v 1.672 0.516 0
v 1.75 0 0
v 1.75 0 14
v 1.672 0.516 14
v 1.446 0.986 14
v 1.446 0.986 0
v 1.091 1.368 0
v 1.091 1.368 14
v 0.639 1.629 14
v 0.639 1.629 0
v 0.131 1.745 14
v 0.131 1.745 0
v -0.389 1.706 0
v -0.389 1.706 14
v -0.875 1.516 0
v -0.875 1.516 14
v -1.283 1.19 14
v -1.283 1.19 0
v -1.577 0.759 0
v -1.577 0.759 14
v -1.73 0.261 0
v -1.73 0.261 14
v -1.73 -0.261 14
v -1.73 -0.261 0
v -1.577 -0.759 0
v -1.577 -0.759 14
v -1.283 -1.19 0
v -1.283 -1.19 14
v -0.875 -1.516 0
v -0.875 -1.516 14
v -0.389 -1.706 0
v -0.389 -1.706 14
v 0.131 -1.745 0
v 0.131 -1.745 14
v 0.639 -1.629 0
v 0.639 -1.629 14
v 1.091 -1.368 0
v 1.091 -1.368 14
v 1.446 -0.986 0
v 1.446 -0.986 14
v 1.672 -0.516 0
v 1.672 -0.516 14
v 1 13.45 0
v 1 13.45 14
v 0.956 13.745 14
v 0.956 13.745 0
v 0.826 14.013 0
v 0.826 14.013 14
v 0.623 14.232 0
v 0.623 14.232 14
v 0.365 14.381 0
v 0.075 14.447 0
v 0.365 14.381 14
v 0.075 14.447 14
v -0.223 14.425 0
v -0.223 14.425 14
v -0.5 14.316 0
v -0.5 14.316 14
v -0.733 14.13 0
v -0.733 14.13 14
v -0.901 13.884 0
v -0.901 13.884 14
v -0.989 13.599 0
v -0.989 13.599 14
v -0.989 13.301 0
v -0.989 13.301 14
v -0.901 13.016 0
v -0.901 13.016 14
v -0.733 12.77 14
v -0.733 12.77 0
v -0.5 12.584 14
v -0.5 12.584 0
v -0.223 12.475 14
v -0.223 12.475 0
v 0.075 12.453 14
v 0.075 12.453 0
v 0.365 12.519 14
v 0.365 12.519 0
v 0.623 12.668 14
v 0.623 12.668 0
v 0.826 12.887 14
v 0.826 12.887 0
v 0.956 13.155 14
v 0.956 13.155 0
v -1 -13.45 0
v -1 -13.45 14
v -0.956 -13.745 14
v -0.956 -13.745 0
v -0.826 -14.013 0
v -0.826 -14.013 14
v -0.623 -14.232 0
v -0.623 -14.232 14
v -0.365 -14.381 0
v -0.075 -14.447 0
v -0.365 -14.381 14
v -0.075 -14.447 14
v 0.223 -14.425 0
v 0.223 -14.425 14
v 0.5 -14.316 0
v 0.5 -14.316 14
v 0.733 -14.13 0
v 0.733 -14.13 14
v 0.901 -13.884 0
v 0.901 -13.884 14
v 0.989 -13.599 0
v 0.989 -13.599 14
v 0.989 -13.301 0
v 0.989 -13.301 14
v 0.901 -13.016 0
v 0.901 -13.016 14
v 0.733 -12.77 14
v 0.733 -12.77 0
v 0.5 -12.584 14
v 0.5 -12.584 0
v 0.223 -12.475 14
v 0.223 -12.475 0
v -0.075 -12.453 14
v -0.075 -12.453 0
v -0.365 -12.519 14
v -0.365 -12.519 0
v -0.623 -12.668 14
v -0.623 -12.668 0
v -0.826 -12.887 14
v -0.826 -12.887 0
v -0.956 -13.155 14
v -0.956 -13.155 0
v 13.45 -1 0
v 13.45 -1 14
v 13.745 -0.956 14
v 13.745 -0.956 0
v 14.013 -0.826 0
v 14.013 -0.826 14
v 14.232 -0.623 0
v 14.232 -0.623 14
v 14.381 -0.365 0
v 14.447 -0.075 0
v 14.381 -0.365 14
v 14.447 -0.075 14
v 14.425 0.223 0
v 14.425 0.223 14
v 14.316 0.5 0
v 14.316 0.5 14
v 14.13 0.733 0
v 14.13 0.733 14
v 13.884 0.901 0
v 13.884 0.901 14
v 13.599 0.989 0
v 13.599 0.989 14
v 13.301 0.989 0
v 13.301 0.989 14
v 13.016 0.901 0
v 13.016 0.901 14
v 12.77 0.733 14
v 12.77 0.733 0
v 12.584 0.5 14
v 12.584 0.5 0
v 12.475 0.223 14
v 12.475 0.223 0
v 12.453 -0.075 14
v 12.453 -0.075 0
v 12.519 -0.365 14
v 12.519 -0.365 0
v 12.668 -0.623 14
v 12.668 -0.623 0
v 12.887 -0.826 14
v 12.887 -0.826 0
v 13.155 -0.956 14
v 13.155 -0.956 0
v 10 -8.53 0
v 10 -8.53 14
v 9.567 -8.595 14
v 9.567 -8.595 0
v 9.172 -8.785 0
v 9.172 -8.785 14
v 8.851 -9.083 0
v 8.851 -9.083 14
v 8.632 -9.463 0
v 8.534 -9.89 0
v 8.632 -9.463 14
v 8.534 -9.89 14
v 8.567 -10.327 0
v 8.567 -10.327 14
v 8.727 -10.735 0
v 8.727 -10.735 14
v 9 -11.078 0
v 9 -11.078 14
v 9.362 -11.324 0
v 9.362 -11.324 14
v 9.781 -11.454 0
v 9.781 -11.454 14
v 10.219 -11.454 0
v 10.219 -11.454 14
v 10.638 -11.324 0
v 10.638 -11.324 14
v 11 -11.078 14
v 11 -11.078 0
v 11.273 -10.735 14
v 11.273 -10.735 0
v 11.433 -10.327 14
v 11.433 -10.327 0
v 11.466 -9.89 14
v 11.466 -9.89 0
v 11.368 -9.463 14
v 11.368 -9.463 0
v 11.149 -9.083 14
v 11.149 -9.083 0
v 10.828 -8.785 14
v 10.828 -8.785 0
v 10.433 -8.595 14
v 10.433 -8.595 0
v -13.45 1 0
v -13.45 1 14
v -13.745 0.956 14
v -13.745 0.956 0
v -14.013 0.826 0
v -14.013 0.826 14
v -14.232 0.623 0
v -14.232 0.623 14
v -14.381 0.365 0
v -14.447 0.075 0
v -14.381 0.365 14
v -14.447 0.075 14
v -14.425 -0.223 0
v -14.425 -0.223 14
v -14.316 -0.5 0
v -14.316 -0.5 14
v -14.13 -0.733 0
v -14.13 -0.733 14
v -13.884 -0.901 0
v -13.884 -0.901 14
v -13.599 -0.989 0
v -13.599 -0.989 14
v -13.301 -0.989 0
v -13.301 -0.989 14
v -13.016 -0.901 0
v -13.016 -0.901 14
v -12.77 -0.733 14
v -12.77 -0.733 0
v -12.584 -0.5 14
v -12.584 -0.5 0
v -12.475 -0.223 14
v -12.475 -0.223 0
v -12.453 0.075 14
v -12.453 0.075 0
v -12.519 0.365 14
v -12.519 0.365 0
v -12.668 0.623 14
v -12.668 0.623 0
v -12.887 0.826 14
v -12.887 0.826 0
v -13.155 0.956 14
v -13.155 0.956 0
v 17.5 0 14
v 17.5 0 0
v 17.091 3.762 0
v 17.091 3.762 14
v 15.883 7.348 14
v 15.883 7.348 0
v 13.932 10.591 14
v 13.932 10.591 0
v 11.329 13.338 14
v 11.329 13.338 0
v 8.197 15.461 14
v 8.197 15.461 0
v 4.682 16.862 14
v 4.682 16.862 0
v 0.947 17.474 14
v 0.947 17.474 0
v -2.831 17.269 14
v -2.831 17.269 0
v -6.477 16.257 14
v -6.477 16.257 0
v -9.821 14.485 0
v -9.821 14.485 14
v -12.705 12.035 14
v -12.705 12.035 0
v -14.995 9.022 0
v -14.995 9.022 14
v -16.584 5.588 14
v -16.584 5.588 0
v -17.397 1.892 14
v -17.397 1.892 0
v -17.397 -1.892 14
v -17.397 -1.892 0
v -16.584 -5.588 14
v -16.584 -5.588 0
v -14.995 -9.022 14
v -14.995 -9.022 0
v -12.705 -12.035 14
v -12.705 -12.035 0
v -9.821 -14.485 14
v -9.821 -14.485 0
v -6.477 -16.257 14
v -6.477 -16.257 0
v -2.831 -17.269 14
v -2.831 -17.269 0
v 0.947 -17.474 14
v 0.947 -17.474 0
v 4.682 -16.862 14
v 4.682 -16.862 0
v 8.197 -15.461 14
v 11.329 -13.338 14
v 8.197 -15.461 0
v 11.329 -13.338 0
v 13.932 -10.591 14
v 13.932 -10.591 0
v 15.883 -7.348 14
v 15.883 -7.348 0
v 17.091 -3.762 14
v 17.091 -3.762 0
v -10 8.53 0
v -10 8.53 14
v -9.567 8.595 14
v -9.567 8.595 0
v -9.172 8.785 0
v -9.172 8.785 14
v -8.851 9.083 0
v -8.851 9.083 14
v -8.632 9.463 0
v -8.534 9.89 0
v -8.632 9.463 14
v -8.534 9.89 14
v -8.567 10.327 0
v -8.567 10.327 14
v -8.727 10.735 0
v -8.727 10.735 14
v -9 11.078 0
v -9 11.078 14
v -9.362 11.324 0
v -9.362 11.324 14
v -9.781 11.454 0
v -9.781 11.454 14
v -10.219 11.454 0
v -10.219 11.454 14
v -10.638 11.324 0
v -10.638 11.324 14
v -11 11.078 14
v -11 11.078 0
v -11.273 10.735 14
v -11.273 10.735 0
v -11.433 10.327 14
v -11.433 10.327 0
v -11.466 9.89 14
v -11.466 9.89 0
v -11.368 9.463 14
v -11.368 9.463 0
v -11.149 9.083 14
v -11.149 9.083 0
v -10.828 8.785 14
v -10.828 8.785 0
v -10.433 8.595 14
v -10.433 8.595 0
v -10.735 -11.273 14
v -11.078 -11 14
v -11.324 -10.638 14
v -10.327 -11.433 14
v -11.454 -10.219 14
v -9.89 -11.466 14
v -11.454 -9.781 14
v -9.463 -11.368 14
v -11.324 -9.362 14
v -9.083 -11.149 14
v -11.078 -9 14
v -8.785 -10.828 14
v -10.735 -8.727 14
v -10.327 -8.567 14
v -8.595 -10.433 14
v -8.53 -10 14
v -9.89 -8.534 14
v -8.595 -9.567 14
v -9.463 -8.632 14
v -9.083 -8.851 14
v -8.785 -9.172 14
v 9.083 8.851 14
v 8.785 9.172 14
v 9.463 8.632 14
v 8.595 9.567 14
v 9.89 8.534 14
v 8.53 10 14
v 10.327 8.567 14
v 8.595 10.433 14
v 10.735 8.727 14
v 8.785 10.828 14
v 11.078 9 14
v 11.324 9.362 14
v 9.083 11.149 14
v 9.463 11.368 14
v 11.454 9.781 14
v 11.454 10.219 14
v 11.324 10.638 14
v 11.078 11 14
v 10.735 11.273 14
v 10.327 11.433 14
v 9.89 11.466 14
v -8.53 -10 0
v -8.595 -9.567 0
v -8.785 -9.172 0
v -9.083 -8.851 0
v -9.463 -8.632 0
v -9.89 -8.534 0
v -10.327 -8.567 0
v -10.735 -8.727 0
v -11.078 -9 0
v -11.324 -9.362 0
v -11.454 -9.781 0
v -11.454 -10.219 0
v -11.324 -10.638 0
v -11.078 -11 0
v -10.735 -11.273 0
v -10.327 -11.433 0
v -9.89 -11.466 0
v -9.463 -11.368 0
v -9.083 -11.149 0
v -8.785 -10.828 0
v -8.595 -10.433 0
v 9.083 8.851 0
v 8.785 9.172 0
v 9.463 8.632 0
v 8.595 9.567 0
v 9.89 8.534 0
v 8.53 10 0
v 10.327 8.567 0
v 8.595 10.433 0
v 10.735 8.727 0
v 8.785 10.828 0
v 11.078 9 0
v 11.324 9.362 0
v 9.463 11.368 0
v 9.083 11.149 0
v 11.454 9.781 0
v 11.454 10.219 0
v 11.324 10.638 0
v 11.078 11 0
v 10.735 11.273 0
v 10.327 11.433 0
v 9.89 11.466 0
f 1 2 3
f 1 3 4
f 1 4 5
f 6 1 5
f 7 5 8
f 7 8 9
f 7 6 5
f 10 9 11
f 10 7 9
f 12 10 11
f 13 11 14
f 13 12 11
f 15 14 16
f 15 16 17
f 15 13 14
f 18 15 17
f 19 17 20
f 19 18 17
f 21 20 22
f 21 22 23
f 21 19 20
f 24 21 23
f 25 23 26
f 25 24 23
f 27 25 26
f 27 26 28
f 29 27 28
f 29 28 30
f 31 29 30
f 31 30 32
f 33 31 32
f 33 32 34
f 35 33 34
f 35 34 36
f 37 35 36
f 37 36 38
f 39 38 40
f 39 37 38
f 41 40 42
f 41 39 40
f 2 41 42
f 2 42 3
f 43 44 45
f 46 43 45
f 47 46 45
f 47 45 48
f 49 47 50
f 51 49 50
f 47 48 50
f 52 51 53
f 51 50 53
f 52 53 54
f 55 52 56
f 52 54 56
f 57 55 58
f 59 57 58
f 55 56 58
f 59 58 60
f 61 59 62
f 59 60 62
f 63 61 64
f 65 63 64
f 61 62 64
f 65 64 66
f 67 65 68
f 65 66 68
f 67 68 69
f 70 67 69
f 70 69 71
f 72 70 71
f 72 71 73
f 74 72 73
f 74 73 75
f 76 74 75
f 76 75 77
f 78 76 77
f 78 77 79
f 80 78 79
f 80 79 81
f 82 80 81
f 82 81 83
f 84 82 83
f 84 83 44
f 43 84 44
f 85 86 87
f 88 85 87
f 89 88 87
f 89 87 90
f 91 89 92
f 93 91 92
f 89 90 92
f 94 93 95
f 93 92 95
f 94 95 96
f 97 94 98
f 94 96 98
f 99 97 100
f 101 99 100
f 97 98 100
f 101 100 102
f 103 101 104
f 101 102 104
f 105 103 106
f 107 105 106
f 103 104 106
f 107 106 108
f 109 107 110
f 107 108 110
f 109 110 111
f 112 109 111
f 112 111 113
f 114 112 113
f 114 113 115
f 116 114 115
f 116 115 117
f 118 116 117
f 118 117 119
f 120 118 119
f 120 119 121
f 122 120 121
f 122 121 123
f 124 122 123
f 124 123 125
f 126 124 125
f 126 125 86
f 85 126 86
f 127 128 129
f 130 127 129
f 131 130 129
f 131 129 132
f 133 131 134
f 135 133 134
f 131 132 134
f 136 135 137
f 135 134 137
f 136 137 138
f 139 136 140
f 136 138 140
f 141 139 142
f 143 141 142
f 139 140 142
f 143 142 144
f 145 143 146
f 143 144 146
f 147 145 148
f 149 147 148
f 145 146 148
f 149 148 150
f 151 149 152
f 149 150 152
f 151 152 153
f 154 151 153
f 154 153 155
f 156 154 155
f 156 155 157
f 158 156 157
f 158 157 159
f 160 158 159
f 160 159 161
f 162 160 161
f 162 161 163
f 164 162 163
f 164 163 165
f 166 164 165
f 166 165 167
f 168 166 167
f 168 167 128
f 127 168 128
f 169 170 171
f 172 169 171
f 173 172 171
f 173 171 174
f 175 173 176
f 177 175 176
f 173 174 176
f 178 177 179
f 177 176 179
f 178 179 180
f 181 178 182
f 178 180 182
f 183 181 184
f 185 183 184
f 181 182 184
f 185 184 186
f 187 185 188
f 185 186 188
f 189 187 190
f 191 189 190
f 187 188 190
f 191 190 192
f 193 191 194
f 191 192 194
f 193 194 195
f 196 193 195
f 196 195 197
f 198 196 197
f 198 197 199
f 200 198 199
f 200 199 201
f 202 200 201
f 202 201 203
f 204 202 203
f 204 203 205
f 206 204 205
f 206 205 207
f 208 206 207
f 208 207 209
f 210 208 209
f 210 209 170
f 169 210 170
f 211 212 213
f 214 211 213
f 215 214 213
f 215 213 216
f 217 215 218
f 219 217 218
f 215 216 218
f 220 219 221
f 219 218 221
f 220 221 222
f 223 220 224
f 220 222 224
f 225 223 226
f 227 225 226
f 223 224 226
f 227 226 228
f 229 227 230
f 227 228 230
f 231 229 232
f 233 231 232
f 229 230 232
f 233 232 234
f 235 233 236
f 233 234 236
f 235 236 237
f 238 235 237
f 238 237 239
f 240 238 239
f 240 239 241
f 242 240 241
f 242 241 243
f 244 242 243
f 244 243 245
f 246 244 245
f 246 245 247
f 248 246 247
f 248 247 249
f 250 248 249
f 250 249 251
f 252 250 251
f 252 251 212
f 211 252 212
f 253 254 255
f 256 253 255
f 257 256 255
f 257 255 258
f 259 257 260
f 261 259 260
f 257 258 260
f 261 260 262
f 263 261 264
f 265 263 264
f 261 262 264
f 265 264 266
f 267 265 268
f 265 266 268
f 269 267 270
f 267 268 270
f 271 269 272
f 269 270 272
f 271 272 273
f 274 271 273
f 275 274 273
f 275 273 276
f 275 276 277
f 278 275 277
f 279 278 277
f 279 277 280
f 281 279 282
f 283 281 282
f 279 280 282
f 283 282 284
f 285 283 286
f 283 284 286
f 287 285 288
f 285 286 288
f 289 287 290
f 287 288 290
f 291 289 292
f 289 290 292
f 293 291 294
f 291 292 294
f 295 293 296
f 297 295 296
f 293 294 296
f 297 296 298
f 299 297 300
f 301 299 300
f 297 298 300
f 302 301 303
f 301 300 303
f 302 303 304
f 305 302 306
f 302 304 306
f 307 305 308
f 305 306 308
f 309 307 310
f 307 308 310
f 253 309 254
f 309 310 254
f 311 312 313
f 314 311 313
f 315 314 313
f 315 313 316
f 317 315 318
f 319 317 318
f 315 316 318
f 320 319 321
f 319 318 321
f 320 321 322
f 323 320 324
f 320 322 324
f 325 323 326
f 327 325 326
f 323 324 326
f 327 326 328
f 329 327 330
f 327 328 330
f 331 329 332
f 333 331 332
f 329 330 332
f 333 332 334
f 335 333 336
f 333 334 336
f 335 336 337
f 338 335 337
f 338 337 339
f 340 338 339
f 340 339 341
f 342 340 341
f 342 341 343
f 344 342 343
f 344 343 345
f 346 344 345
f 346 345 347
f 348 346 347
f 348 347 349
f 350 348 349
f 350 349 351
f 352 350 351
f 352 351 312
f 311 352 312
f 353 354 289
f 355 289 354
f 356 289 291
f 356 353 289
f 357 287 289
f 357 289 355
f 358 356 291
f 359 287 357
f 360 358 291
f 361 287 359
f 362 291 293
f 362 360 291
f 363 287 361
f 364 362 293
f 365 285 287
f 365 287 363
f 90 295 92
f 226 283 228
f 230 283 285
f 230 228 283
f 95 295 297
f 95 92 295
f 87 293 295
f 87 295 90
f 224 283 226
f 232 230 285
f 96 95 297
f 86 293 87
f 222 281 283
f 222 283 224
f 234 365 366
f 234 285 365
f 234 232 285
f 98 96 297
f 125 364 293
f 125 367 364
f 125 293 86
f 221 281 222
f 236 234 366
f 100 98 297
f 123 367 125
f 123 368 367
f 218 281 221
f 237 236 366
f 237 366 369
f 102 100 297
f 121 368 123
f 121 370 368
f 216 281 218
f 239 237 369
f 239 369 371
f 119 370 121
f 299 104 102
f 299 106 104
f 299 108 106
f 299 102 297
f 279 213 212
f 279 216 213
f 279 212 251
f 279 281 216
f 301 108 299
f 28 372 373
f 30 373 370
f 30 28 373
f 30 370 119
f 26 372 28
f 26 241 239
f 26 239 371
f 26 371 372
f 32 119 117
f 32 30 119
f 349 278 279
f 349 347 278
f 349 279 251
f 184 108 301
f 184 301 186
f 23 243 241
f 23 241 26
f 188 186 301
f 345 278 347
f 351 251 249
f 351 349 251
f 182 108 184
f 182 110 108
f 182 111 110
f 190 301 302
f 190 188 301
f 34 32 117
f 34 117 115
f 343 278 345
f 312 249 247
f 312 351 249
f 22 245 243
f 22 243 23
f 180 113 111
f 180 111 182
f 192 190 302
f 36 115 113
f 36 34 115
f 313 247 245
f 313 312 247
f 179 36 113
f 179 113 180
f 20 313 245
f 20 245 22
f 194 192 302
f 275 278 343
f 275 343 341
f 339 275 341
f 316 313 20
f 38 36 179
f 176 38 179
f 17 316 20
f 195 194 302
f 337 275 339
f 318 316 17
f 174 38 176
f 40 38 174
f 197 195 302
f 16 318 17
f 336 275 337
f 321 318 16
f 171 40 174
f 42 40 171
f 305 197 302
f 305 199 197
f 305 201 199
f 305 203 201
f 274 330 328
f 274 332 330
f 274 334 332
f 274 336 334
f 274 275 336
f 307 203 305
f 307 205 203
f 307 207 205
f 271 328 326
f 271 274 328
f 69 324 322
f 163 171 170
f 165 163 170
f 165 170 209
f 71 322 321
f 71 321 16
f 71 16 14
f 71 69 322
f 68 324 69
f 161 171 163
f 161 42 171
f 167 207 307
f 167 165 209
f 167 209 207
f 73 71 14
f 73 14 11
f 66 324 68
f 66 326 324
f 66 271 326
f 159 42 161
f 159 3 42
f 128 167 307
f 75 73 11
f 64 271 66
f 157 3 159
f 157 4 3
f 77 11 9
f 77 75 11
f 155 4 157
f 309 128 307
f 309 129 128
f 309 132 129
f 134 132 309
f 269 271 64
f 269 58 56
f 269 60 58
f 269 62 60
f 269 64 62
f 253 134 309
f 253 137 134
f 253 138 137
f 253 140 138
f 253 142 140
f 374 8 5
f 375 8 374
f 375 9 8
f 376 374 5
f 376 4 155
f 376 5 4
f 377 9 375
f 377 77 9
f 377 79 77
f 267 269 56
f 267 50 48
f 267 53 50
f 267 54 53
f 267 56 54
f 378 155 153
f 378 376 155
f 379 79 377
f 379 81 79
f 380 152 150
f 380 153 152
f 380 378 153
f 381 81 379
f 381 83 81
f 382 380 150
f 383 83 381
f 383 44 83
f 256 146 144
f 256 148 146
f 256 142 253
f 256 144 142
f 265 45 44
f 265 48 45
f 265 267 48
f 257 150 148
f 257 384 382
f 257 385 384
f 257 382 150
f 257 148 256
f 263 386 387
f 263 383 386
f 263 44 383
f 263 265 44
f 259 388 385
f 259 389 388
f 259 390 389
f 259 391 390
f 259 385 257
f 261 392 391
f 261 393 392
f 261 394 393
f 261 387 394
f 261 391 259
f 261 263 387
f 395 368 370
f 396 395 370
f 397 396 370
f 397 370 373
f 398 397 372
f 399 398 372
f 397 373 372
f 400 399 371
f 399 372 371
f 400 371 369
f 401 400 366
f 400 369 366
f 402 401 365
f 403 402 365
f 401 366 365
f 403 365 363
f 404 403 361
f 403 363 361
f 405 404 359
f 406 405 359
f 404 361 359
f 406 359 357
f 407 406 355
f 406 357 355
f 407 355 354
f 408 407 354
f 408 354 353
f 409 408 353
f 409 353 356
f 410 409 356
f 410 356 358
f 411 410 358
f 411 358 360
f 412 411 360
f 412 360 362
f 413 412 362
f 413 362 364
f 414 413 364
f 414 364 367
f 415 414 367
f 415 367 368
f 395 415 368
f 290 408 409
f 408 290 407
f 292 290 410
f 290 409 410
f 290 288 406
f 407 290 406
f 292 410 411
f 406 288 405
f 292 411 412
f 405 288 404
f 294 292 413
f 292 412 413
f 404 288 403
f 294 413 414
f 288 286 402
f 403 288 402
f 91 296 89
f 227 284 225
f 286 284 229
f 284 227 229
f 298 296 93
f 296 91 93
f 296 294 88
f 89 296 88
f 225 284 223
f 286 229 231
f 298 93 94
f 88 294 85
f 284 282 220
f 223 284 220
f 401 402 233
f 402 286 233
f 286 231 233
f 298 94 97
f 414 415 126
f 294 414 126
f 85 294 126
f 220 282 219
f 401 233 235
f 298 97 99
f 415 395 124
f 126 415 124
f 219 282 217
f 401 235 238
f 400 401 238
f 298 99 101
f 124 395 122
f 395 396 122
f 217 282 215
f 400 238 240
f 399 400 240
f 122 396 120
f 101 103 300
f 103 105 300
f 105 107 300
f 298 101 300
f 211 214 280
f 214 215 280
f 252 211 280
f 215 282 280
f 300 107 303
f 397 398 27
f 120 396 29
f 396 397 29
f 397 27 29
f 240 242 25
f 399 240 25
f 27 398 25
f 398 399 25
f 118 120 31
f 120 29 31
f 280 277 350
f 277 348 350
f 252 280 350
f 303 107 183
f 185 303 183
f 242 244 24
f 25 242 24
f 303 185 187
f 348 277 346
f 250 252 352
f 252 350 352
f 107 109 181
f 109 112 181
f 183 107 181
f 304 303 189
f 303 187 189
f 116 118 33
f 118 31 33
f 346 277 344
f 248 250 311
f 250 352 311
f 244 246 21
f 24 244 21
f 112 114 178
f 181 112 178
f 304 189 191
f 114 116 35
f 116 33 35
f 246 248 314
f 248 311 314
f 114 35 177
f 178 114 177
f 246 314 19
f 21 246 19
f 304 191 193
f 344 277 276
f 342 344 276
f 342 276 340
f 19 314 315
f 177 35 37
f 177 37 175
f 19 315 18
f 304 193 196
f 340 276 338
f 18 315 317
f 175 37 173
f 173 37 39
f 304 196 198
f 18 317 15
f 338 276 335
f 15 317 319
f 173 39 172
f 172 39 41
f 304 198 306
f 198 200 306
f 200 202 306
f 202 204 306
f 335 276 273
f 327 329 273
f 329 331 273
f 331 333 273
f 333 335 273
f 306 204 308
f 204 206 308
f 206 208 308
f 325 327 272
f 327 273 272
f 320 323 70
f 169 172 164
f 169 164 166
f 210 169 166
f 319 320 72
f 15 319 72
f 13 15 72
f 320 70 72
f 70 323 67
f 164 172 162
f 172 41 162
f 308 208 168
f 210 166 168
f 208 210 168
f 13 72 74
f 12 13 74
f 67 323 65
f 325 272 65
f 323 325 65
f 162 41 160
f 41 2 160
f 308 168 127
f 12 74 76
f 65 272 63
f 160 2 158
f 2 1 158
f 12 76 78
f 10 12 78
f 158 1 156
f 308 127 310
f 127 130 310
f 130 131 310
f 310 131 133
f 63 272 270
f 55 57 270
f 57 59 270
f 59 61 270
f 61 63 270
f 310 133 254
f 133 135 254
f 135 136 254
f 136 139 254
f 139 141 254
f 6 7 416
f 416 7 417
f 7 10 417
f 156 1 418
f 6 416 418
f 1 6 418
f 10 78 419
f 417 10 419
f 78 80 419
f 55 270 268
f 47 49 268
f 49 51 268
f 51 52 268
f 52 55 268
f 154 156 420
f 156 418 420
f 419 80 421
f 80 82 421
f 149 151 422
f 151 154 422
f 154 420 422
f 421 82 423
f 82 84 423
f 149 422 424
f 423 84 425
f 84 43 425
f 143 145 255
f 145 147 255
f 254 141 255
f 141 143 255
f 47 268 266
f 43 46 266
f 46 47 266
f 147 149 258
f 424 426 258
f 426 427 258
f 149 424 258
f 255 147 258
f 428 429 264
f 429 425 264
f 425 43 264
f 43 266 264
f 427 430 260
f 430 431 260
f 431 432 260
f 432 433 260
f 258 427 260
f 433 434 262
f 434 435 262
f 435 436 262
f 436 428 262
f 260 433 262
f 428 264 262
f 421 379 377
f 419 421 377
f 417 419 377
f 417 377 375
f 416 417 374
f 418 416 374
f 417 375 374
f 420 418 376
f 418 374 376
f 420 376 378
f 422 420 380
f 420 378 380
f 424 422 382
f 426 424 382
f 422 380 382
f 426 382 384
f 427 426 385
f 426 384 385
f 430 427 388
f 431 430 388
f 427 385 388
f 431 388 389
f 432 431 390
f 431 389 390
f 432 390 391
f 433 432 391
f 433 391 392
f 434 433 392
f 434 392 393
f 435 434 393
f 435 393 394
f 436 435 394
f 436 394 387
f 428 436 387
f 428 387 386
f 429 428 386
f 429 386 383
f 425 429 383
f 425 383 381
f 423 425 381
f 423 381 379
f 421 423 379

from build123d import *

# Parameters (mm, degrees)
SKETCH1_R           = 17.5
SKETCH1_R_2         = 1.75
BOSS_EXTRUDE1_DEPTH = 14
SKETCH2_R           = 1
CUT_EXTRUDE1_DEPTH  = 29.434134416
CIRPATTERN1_COUNT   = 4
SKETCH3_R           = 1.47
CUT_EXTRUDE2_DEPTH  = 29.434134416
CIRPATTERN2_COUNT   = 4


with BuildPart() as part:
    # Sketch1 → Boss-Extrude1 (new body)
    with BuildSketch(Plane.XY):
        Circle(SKETCH1_R)
        Circle(SKETCH1_R_2, mode=Mode.SUBTRACT)
    extrude(amount=BOSS_EXTRUDE1_DEPTH)

    # Sketch2 → Cut-Extrude1 (cut, through all)
    with BuildSketch(Plane.XY.offset(14)):
        with Locations((0, 13.45)):
            Circle(SKETCH2_R)
    cut_extrude1 = extrude(amount=-CUT_EXTRUDE1_DEPTH, mode=Mode.SUBTRACT)

    # CirPattern1: Cut-Extrude1 ×4 about axis
    cirpattern1_axis = Axis((0, 0, 0), (0, 0, 1))
    for i in range(1, CIRPATTERN1_COUNT):
        add(cut_extrude1.rotate(cirpattern1_axis, i * 360 / CIRPATTERN1_COUNT), mode=Mode.SUBTRACT)

    # Sketch3 → Cut-Extrude2 (cut, through all)
    with BuildSketch(Plane.XY.offset(14)):
        with Locations((-10, -10)):
            Circle(SKETCH3_R)
    cut_extrude2 = extrude(amount=-CUT_EXTRUDE2_DEPTH, mode=Mode.SUBTRACT)

    # CirPattern2: Cut-Extrude2 ×4 about axis
    cirpattern2_axis = Axis((0, 0, 0), (0, 0, 1))
    for i in range(1, CIRPATTERN2_COUNT):
        add(cut_extrude2.rotate(cirpattern2_axis, i * 360 / CIRPATTERN2_COUNT), mode=Mode.SUBTRACT)


solid = part.part
